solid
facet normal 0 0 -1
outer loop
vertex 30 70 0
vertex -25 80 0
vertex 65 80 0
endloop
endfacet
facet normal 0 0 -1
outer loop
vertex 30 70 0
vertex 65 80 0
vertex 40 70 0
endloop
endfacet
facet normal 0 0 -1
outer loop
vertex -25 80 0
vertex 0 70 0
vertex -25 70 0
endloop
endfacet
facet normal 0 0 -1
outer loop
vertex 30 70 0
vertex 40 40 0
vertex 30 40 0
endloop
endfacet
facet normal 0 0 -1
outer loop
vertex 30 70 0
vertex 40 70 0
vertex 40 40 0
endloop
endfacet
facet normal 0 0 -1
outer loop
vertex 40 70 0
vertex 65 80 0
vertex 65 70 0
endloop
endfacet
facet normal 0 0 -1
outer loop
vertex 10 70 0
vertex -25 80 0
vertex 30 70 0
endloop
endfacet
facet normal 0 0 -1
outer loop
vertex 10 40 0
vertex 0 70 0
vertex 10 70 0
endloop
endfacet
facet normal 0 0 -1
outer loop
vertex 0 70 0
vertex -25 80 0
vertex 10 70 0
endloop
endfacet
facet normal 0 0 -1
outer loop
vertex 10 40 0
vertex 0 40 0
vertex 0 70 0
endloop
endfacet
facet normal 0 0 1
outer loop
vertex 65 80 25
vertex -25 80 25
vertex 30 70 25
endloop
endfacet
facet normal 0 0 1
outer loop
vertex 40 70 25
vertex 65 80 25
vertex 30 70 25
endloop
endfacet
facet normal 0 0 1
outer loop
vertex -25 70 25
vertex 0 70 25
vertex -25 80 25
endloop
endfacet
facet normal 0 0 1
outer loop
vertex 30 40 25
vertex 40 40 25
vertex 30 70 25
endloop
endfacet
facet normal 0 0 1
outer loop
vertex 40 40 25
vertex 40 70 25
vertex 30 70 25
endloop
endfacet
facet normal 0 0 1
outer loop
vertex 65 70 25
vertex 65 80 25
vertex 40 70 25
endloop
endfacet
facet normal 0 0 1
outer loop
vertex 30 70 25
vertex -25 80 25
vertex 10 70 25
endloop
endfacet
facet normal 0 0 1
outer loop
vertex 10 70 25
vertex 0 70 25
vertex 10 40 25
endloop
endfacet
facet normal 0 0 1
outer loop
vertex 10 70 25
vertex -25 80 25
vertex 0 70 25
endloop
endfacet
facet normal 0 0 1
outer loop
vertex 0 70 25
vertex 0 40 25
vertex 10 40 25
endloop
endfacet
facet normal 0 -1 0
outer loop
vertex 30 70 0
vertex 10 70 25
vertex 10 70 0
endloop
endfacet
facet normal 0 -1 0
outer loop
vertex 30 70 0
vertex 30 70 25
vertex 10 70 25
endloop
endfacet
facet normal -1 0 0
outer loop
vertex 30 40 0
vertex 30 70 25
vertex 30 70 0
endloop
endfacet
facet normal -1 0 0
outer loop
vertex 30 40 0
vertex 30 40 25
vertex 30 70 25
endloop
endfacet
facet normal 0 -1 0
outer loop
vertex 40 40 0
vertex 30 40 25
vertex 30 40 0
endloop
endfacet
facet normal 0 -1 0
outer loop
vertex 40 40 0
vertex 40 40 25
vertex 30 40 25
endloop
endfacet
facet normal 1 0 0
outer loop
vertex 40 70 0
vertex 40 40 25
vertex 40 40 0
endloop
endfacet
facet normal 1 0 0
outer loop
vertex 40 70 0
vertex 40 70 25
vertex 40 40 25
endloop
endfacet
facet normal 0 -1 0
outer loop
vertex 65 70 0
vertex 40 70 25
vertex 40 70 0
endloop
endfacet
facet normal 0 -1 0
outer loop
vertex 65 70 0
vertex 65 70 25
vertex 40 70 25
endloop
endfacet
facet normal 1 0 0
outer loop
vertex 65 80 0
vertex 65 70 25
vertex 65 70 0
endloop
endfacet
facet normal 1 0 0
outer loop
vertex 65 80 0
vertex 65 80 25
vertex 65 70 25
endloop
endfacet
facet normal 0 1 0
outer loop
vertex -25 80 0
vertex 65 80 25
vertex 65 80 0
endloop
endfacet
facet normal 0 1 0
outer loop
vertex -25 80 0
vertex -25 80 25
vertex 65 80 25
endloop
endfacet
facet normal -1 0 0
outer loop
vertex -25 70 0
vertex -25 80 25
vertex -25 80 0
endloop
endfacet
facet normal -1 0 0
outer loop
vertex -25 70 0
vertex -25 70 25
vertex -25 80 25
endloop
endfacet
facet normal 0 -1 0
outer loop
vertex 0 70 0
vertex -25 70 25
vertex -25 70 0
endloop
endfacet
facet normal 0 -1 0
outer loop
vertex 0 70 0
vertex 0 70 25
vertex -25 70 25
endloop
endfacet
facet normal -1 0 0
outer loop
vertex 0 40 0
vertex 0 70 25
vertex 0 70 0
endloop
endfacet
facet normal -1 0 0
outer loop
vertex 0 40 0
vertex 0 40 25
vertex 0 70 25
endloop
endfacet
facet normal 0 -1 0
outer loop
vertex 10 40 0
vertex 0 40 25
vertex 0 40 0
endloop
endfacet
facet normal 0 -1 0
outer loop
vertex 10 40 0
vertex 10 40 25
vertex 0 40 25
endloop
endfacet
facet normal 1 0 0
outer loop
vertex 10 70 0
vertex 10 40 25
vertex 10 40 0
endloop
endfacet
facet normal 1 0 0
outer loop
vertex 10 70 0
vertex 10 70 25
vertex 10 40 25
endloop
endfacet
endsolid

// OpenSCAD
thick=10;
leg=25;
ep=25;
onLogo=false;

module logo(){
    translate([2,70+thick/2,40])
    rotate([0,90,180]) 
        linear_extrude(2) resize([0,40,0], auto=true) import("logo.dxf");
}


difference(){
    linear_extrude(ep)  difference(){
        union (){
            square([40, 70+thick]);
            translate([40, 70]) square([leg, thick]);
            translate([-leg, 70]) square([leg, thick]);
        }
        translate([thick, 0, 0])square([40-(thick*2), 70]);
        #square([70,40]);

    }
 
    if(onLogo)logo();
}
